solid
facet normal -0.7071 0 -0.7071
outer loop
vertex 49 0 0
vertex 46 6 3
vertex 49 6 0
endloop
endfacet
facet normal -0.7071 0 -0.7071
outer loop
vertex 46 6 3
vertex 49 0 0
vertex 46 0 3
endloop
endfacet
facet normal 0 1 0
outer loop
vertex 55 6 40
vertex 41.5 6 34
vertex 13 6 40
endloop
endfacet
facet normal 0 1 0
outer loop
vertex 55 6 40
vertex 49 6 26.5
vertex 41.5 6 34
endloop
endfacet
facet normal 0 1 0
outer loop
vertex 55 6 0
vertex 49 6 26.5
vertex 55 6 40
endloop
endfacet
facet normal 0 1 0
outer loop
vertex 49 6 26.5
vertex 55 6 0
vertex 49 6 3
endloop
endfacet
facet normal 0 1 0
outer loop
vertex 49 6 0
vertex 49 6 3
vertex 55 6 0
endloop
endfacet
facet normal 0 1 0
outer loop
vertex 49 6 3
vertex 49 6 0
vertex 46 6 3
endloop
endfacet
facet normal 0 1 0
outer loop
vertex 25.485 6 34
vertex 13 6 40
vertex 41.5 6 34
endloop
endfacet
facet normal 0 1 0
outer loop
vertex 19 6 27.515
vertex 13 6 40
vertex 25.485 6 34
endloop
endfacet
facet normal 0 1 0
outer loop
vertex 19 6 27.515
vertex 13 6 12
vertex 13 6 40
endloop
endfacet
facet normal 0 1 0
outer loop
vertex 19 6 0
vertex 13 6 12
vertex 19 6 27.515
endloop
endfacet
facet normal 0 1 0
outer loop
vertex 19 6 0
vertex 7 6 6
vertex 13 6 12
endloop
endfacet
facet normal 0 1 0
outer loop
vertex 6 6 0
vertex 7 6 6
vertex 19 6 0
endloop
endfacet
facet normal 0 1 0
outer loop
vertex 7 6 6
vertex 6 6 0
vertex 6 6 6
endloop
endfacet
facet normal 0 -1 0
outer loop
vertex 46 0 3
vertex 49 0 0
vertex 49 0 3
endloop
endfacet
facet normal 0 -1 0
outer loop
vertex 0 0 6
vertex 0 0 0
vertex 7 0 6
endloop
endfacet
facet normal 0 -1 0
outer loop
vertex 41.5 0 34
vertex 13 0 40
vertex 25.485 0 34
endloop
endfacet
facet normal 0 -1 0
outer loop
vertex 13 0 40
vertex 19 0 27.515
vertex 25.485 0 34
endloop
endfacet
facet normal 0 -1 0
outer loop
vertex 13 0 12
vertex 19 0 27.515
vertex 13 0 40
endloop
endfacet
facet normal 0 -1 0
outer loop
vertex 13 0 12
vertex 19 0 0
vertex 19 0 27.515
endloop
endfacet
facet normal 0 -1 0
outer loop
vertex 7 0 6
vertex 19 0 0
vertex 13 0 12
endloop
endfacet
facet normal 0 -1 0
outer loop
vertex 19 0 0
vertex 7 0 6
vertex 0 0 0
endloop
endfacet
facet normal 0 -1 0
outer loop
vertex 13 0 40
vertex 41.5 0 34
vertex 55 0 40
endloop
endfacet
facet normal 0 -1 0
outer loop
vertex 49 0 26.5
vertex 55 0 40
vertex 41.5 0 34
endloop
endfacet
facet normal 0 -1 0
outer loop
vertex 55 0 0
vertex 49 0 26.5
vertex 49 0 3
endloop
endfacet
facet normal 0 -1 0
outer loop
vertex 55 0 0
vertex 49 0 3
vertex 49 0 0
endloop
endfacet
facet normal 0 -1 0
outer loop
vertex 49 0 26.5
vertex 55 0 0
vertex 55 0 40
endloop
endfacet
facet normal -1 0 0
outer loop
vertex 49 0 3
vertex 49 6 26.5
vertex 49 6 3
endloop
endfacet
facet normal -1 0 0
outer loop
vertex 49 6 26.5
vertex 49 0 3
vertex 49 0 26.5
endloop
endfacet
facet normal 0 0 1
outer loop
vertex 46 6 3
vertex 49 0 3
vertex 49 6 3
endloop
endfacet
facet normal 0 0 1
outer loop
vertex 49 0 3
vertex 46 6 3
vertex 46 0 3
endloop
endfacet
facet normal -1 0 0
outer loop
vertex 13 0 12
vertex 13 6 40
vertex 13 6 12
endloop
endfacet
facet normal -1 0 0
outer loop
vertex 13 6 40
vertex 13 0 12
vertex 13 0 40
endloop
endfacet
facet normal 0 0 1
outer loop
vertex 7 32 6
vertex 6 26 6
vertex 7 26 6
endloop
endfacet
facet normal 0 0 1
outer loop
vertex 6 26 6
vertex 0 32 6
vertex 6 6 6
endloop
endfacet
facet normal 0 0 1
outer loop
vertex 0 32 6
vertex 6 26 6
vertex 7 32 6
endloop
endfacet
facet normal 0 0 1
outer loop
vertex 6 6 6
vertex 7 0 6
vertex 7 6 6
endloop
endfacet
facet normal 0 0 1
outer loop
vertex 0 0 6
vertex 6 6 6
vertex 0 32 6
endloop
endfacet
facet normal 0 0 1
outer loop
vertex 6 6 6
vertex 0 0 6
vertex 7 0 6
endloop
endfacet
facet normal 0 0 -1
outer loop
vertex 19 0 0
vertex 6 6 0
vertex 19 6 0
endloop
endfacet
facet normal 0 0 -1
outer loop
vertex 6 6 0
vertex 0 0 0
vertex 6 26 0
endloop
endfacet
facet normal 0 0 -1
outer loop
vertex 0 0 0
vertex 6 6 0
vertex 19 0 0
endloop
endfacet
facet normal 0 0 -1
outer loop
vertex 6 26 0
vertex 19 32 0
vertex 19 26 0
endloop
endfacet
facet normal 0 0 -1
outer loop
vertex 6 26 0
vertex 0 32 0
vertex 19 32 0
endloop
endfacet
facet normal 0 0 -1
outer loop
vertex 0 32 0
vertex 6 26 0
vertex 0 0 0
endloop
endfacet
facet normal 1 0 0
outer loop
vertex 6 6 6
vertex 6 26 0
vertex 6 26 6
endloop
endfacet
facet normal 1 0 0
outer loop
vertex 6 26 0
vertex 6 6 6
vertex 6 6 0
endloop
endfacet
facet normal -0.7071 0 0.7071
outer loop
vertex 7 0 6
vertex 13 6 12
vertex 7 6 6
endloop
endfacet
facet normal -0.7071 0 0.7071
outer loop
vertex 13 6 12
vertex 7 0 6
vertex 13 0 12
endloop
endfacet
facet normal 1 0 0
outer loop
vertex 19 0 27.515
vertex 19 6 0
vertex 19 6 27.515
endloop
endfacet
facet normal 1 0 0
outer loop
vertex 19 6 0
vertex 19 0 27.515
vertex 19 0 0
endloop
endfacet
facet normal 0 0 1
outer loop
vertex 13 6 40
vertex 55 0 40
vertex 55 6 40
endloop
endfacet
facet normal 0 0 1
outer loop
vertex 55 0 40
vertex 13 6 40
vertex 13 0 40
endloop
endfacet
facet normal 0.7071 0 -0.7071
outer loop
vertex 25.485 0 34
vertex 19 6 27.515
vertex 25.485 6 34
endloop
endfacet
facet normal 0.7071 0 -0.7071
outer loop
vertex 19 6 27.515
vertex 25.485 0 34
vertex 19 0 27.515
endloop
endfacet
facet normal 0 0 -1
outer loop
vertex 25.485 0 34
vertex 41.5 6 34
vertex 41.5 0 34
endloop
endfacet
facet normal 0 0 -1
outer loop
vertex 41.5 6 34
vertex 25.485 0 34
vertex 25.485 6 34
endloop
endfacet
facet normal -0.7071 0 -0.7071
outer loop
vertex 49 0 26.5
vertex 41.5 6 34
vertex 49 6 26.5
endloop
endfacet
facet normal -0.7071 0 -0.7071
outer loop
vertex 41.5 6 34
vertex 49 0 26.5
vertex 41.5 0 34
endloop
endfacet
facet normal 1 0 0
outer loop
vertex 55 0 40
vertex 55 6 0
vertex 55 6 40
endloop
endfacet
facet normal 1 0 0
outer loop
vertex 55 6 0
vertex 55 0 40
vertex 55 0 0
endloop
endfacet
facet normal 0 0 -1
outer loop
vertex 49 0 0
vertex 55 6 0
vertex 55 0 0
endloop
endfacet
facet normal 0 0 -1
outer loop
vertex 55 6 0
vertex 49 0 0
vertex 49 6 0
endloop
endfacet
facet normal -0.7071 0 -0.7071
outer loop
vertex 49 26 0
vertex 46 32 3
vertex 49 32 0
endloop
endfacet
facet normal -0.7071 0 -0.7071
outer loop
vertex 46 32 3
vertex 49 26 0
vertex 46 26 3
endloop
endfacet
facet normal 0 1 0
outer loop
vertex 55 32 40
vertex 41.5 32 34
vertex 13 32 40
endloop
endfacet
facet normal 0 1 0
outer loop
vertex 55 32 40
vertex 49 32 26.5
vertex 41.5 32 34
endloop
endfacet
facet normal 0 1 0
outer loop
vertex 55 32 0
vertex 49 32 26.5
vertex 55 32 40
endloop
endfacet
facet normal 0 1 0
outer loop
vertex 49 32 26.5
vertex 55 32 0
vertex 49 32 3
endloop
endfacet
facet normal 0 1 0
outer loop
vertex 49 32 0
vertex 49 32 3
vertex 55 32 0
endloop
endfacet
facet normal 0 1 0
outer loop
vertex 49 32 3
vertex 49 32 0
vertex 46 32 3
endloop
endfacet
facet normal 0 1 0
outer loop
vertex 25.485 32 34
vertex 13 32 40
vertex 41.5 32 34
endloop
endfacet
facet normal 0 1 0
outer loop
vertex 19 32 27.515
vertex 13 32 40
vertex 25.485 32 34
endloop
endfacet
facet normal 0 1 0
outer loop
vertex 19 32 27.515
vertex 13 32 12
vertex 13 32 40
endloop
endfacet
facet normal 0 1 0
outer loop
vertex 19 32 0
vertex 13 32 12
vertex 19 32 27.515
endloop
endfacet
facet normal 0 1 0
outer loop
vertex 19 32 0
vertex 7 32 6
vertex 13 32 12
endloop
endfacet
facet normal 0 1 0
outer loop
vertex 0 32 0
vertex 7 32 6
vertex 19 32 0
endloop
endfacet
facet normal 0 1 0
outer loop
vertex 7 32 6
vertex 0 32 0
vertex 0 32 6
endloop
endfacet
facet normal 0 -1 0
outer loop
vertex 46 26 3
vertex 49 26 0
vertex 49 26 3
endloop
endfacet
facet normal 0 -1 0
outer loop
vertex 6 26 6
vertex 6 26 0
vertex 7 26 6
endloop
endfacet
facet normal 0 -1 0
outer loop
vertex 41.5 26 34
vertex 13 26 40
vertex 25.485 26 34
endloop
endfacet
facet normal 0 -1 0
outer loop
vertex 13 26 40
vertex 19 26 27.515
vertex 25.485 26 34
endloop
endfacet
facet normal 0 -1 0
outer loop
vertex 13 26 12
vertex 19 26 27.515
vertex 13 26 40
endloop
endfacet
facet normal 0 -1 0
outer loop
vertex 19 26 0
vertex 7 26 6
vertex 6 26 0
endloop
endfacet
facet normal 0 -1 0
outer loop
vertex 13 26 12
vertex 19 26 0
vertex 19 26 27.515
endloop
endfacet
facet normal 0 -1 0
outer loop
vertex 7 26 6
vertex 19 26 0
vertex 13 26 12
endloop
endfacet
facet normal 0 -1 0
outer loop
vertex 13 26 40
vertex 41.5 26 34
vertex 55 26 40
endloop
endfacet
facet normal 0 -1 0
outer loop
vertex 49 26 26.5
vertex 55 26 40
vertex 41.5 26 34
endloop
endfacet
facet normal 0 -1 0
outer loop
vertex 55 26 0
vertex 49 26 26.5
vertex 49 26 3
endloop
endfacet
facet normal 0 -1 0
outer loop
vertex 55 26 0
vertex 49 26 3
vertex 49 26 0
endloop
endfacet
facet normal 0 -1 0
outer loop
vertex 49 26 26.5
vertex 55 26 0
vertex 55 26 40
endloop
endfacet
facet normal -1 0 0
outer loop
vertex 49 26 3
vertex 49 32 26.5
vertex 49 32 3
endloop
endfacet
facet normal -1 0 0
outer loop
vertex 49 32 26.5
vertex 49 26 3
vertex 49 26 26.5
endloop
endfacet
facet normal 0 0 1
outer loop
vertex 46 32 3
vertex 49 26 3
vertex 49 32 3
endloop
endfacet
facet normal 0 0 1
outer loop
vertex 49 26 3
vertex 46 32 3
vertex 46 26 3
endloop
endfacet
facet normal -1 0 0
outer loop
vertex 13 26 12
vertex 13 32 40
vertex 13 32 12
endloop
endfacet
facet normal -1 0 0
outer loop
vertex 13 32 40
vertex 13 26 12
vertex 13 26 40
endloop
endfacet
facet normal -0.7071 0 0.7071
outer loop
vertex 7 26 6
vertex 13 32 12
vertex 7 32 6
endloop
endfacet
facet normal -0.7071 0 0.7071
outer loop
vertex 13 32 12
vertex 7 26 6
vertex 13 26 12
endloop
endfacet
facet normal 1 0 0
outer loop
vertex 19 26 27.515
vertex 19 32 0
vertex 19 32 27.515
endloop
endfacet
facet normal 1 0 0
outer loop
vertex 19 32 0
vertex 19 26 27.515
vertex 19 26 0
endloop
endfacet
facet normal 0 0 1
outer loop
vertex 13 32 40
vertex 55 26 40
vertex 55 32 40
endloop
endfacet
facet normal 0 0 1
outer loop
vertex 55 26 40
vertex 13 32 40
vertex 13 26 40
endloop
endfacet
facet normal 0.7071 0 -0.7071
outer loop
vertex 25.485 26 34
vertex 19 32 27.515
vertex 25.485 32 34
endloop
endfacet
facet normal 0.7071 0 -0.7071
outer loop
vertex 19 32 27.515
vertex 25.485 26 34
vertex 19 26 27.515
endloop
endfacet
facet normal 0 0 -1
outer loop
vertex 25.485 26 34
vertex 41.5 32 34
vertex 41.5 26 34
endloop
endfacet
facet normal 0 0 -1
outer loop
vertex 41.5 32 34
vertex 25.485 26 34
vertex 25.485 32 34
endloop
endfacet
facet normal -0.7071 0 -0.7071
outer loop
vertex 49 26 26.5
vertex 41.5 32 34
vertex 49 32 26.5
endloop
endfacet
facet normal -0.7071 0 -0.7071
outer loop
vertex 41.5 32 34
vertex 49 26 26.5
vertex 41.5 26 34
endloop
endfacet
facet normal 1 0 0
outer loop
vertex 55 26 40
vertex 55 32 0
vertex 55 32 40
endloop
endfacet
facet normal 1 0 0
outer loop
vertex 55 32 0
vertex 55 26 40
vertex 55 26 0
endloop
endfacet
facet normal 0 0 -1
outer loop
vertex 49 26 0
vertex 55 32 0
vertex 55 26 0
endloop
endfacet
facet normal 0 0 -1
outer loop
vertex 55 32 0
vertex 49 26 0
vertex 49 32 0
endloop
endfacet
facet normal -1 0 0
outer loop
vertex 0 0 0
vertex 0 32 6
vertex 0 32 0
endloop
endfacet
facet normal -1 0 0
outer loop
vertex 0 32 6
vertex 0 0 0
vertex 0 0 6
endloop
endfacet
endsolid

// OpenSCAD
stick_width = 20;
stick_thickness = 7;
chair_width = 30;
thickness = 6;
height_front = 40;
height_back = 40;
tooth_size = 3;

cube([thickness, thickness * 2 + stick_width, thickness]); //Loop connecting part.

for(y = [0:thickness + stick_width:thickness + stick_width]) {
	translate([0, y, 0]) {
		translate([thickness, 0, 0])
			cube([stick_thickness, thickness, thickness]); //Loop horizontal part.
		translate([stick_thickness, 0, thickness])
			rotate([0, 45, 0])
				cube([thickness, thickness, thickness * sqrt(2)]); //Lower chamfer.
		translate([thickness + stick_thickness, 0, 0])
			cube([thickness, thickness, height_back]); //Climb at loop.
		translate([thickness + stick_thickness, 0, height_back * 3 / 4])
			rotate([0, 45, 0])
				cube([thickness, thickness, height_back * 1 / 4 * sqrt(2)]); //Climb chamfer.
		translate([thickness * 2 + stick_thickness, 0, height_back - thickness])
			cube([chair_width, thickness, thickness]); //Bridge.
		translate([thickness * 2 + stick_thickness + chair_width * 3 / 4, 0, height_back - thickness])
			rotate([0, 45, 0])
				cube([chair_width * 1 / 4 * sqrt(2), thickness, thickness]); //Fall chamfer.
		translate([thickness * 2 + stick_thickness + chair_width, 0, height_back - height_front])
			cube([thickness, thickness, height_front]); //Fall at front.
		difference() {
			translate([thickness * 2 + stick_thickness + chair_width - tooth_size, 0, tooth_size])
				rotate([0, 45, 0])
					cube([tooth_size * sqrt(2), thickness, tooth_size * sqrt(2)]); //Tooth body.
			translate([thickness * 2 + stick_thickness + chair_width - tooth_size, 0, tooth_size])
				cube([tooth_size, thickness, tooth_size]); //Subtraction from tooth.
		}
	}
}
